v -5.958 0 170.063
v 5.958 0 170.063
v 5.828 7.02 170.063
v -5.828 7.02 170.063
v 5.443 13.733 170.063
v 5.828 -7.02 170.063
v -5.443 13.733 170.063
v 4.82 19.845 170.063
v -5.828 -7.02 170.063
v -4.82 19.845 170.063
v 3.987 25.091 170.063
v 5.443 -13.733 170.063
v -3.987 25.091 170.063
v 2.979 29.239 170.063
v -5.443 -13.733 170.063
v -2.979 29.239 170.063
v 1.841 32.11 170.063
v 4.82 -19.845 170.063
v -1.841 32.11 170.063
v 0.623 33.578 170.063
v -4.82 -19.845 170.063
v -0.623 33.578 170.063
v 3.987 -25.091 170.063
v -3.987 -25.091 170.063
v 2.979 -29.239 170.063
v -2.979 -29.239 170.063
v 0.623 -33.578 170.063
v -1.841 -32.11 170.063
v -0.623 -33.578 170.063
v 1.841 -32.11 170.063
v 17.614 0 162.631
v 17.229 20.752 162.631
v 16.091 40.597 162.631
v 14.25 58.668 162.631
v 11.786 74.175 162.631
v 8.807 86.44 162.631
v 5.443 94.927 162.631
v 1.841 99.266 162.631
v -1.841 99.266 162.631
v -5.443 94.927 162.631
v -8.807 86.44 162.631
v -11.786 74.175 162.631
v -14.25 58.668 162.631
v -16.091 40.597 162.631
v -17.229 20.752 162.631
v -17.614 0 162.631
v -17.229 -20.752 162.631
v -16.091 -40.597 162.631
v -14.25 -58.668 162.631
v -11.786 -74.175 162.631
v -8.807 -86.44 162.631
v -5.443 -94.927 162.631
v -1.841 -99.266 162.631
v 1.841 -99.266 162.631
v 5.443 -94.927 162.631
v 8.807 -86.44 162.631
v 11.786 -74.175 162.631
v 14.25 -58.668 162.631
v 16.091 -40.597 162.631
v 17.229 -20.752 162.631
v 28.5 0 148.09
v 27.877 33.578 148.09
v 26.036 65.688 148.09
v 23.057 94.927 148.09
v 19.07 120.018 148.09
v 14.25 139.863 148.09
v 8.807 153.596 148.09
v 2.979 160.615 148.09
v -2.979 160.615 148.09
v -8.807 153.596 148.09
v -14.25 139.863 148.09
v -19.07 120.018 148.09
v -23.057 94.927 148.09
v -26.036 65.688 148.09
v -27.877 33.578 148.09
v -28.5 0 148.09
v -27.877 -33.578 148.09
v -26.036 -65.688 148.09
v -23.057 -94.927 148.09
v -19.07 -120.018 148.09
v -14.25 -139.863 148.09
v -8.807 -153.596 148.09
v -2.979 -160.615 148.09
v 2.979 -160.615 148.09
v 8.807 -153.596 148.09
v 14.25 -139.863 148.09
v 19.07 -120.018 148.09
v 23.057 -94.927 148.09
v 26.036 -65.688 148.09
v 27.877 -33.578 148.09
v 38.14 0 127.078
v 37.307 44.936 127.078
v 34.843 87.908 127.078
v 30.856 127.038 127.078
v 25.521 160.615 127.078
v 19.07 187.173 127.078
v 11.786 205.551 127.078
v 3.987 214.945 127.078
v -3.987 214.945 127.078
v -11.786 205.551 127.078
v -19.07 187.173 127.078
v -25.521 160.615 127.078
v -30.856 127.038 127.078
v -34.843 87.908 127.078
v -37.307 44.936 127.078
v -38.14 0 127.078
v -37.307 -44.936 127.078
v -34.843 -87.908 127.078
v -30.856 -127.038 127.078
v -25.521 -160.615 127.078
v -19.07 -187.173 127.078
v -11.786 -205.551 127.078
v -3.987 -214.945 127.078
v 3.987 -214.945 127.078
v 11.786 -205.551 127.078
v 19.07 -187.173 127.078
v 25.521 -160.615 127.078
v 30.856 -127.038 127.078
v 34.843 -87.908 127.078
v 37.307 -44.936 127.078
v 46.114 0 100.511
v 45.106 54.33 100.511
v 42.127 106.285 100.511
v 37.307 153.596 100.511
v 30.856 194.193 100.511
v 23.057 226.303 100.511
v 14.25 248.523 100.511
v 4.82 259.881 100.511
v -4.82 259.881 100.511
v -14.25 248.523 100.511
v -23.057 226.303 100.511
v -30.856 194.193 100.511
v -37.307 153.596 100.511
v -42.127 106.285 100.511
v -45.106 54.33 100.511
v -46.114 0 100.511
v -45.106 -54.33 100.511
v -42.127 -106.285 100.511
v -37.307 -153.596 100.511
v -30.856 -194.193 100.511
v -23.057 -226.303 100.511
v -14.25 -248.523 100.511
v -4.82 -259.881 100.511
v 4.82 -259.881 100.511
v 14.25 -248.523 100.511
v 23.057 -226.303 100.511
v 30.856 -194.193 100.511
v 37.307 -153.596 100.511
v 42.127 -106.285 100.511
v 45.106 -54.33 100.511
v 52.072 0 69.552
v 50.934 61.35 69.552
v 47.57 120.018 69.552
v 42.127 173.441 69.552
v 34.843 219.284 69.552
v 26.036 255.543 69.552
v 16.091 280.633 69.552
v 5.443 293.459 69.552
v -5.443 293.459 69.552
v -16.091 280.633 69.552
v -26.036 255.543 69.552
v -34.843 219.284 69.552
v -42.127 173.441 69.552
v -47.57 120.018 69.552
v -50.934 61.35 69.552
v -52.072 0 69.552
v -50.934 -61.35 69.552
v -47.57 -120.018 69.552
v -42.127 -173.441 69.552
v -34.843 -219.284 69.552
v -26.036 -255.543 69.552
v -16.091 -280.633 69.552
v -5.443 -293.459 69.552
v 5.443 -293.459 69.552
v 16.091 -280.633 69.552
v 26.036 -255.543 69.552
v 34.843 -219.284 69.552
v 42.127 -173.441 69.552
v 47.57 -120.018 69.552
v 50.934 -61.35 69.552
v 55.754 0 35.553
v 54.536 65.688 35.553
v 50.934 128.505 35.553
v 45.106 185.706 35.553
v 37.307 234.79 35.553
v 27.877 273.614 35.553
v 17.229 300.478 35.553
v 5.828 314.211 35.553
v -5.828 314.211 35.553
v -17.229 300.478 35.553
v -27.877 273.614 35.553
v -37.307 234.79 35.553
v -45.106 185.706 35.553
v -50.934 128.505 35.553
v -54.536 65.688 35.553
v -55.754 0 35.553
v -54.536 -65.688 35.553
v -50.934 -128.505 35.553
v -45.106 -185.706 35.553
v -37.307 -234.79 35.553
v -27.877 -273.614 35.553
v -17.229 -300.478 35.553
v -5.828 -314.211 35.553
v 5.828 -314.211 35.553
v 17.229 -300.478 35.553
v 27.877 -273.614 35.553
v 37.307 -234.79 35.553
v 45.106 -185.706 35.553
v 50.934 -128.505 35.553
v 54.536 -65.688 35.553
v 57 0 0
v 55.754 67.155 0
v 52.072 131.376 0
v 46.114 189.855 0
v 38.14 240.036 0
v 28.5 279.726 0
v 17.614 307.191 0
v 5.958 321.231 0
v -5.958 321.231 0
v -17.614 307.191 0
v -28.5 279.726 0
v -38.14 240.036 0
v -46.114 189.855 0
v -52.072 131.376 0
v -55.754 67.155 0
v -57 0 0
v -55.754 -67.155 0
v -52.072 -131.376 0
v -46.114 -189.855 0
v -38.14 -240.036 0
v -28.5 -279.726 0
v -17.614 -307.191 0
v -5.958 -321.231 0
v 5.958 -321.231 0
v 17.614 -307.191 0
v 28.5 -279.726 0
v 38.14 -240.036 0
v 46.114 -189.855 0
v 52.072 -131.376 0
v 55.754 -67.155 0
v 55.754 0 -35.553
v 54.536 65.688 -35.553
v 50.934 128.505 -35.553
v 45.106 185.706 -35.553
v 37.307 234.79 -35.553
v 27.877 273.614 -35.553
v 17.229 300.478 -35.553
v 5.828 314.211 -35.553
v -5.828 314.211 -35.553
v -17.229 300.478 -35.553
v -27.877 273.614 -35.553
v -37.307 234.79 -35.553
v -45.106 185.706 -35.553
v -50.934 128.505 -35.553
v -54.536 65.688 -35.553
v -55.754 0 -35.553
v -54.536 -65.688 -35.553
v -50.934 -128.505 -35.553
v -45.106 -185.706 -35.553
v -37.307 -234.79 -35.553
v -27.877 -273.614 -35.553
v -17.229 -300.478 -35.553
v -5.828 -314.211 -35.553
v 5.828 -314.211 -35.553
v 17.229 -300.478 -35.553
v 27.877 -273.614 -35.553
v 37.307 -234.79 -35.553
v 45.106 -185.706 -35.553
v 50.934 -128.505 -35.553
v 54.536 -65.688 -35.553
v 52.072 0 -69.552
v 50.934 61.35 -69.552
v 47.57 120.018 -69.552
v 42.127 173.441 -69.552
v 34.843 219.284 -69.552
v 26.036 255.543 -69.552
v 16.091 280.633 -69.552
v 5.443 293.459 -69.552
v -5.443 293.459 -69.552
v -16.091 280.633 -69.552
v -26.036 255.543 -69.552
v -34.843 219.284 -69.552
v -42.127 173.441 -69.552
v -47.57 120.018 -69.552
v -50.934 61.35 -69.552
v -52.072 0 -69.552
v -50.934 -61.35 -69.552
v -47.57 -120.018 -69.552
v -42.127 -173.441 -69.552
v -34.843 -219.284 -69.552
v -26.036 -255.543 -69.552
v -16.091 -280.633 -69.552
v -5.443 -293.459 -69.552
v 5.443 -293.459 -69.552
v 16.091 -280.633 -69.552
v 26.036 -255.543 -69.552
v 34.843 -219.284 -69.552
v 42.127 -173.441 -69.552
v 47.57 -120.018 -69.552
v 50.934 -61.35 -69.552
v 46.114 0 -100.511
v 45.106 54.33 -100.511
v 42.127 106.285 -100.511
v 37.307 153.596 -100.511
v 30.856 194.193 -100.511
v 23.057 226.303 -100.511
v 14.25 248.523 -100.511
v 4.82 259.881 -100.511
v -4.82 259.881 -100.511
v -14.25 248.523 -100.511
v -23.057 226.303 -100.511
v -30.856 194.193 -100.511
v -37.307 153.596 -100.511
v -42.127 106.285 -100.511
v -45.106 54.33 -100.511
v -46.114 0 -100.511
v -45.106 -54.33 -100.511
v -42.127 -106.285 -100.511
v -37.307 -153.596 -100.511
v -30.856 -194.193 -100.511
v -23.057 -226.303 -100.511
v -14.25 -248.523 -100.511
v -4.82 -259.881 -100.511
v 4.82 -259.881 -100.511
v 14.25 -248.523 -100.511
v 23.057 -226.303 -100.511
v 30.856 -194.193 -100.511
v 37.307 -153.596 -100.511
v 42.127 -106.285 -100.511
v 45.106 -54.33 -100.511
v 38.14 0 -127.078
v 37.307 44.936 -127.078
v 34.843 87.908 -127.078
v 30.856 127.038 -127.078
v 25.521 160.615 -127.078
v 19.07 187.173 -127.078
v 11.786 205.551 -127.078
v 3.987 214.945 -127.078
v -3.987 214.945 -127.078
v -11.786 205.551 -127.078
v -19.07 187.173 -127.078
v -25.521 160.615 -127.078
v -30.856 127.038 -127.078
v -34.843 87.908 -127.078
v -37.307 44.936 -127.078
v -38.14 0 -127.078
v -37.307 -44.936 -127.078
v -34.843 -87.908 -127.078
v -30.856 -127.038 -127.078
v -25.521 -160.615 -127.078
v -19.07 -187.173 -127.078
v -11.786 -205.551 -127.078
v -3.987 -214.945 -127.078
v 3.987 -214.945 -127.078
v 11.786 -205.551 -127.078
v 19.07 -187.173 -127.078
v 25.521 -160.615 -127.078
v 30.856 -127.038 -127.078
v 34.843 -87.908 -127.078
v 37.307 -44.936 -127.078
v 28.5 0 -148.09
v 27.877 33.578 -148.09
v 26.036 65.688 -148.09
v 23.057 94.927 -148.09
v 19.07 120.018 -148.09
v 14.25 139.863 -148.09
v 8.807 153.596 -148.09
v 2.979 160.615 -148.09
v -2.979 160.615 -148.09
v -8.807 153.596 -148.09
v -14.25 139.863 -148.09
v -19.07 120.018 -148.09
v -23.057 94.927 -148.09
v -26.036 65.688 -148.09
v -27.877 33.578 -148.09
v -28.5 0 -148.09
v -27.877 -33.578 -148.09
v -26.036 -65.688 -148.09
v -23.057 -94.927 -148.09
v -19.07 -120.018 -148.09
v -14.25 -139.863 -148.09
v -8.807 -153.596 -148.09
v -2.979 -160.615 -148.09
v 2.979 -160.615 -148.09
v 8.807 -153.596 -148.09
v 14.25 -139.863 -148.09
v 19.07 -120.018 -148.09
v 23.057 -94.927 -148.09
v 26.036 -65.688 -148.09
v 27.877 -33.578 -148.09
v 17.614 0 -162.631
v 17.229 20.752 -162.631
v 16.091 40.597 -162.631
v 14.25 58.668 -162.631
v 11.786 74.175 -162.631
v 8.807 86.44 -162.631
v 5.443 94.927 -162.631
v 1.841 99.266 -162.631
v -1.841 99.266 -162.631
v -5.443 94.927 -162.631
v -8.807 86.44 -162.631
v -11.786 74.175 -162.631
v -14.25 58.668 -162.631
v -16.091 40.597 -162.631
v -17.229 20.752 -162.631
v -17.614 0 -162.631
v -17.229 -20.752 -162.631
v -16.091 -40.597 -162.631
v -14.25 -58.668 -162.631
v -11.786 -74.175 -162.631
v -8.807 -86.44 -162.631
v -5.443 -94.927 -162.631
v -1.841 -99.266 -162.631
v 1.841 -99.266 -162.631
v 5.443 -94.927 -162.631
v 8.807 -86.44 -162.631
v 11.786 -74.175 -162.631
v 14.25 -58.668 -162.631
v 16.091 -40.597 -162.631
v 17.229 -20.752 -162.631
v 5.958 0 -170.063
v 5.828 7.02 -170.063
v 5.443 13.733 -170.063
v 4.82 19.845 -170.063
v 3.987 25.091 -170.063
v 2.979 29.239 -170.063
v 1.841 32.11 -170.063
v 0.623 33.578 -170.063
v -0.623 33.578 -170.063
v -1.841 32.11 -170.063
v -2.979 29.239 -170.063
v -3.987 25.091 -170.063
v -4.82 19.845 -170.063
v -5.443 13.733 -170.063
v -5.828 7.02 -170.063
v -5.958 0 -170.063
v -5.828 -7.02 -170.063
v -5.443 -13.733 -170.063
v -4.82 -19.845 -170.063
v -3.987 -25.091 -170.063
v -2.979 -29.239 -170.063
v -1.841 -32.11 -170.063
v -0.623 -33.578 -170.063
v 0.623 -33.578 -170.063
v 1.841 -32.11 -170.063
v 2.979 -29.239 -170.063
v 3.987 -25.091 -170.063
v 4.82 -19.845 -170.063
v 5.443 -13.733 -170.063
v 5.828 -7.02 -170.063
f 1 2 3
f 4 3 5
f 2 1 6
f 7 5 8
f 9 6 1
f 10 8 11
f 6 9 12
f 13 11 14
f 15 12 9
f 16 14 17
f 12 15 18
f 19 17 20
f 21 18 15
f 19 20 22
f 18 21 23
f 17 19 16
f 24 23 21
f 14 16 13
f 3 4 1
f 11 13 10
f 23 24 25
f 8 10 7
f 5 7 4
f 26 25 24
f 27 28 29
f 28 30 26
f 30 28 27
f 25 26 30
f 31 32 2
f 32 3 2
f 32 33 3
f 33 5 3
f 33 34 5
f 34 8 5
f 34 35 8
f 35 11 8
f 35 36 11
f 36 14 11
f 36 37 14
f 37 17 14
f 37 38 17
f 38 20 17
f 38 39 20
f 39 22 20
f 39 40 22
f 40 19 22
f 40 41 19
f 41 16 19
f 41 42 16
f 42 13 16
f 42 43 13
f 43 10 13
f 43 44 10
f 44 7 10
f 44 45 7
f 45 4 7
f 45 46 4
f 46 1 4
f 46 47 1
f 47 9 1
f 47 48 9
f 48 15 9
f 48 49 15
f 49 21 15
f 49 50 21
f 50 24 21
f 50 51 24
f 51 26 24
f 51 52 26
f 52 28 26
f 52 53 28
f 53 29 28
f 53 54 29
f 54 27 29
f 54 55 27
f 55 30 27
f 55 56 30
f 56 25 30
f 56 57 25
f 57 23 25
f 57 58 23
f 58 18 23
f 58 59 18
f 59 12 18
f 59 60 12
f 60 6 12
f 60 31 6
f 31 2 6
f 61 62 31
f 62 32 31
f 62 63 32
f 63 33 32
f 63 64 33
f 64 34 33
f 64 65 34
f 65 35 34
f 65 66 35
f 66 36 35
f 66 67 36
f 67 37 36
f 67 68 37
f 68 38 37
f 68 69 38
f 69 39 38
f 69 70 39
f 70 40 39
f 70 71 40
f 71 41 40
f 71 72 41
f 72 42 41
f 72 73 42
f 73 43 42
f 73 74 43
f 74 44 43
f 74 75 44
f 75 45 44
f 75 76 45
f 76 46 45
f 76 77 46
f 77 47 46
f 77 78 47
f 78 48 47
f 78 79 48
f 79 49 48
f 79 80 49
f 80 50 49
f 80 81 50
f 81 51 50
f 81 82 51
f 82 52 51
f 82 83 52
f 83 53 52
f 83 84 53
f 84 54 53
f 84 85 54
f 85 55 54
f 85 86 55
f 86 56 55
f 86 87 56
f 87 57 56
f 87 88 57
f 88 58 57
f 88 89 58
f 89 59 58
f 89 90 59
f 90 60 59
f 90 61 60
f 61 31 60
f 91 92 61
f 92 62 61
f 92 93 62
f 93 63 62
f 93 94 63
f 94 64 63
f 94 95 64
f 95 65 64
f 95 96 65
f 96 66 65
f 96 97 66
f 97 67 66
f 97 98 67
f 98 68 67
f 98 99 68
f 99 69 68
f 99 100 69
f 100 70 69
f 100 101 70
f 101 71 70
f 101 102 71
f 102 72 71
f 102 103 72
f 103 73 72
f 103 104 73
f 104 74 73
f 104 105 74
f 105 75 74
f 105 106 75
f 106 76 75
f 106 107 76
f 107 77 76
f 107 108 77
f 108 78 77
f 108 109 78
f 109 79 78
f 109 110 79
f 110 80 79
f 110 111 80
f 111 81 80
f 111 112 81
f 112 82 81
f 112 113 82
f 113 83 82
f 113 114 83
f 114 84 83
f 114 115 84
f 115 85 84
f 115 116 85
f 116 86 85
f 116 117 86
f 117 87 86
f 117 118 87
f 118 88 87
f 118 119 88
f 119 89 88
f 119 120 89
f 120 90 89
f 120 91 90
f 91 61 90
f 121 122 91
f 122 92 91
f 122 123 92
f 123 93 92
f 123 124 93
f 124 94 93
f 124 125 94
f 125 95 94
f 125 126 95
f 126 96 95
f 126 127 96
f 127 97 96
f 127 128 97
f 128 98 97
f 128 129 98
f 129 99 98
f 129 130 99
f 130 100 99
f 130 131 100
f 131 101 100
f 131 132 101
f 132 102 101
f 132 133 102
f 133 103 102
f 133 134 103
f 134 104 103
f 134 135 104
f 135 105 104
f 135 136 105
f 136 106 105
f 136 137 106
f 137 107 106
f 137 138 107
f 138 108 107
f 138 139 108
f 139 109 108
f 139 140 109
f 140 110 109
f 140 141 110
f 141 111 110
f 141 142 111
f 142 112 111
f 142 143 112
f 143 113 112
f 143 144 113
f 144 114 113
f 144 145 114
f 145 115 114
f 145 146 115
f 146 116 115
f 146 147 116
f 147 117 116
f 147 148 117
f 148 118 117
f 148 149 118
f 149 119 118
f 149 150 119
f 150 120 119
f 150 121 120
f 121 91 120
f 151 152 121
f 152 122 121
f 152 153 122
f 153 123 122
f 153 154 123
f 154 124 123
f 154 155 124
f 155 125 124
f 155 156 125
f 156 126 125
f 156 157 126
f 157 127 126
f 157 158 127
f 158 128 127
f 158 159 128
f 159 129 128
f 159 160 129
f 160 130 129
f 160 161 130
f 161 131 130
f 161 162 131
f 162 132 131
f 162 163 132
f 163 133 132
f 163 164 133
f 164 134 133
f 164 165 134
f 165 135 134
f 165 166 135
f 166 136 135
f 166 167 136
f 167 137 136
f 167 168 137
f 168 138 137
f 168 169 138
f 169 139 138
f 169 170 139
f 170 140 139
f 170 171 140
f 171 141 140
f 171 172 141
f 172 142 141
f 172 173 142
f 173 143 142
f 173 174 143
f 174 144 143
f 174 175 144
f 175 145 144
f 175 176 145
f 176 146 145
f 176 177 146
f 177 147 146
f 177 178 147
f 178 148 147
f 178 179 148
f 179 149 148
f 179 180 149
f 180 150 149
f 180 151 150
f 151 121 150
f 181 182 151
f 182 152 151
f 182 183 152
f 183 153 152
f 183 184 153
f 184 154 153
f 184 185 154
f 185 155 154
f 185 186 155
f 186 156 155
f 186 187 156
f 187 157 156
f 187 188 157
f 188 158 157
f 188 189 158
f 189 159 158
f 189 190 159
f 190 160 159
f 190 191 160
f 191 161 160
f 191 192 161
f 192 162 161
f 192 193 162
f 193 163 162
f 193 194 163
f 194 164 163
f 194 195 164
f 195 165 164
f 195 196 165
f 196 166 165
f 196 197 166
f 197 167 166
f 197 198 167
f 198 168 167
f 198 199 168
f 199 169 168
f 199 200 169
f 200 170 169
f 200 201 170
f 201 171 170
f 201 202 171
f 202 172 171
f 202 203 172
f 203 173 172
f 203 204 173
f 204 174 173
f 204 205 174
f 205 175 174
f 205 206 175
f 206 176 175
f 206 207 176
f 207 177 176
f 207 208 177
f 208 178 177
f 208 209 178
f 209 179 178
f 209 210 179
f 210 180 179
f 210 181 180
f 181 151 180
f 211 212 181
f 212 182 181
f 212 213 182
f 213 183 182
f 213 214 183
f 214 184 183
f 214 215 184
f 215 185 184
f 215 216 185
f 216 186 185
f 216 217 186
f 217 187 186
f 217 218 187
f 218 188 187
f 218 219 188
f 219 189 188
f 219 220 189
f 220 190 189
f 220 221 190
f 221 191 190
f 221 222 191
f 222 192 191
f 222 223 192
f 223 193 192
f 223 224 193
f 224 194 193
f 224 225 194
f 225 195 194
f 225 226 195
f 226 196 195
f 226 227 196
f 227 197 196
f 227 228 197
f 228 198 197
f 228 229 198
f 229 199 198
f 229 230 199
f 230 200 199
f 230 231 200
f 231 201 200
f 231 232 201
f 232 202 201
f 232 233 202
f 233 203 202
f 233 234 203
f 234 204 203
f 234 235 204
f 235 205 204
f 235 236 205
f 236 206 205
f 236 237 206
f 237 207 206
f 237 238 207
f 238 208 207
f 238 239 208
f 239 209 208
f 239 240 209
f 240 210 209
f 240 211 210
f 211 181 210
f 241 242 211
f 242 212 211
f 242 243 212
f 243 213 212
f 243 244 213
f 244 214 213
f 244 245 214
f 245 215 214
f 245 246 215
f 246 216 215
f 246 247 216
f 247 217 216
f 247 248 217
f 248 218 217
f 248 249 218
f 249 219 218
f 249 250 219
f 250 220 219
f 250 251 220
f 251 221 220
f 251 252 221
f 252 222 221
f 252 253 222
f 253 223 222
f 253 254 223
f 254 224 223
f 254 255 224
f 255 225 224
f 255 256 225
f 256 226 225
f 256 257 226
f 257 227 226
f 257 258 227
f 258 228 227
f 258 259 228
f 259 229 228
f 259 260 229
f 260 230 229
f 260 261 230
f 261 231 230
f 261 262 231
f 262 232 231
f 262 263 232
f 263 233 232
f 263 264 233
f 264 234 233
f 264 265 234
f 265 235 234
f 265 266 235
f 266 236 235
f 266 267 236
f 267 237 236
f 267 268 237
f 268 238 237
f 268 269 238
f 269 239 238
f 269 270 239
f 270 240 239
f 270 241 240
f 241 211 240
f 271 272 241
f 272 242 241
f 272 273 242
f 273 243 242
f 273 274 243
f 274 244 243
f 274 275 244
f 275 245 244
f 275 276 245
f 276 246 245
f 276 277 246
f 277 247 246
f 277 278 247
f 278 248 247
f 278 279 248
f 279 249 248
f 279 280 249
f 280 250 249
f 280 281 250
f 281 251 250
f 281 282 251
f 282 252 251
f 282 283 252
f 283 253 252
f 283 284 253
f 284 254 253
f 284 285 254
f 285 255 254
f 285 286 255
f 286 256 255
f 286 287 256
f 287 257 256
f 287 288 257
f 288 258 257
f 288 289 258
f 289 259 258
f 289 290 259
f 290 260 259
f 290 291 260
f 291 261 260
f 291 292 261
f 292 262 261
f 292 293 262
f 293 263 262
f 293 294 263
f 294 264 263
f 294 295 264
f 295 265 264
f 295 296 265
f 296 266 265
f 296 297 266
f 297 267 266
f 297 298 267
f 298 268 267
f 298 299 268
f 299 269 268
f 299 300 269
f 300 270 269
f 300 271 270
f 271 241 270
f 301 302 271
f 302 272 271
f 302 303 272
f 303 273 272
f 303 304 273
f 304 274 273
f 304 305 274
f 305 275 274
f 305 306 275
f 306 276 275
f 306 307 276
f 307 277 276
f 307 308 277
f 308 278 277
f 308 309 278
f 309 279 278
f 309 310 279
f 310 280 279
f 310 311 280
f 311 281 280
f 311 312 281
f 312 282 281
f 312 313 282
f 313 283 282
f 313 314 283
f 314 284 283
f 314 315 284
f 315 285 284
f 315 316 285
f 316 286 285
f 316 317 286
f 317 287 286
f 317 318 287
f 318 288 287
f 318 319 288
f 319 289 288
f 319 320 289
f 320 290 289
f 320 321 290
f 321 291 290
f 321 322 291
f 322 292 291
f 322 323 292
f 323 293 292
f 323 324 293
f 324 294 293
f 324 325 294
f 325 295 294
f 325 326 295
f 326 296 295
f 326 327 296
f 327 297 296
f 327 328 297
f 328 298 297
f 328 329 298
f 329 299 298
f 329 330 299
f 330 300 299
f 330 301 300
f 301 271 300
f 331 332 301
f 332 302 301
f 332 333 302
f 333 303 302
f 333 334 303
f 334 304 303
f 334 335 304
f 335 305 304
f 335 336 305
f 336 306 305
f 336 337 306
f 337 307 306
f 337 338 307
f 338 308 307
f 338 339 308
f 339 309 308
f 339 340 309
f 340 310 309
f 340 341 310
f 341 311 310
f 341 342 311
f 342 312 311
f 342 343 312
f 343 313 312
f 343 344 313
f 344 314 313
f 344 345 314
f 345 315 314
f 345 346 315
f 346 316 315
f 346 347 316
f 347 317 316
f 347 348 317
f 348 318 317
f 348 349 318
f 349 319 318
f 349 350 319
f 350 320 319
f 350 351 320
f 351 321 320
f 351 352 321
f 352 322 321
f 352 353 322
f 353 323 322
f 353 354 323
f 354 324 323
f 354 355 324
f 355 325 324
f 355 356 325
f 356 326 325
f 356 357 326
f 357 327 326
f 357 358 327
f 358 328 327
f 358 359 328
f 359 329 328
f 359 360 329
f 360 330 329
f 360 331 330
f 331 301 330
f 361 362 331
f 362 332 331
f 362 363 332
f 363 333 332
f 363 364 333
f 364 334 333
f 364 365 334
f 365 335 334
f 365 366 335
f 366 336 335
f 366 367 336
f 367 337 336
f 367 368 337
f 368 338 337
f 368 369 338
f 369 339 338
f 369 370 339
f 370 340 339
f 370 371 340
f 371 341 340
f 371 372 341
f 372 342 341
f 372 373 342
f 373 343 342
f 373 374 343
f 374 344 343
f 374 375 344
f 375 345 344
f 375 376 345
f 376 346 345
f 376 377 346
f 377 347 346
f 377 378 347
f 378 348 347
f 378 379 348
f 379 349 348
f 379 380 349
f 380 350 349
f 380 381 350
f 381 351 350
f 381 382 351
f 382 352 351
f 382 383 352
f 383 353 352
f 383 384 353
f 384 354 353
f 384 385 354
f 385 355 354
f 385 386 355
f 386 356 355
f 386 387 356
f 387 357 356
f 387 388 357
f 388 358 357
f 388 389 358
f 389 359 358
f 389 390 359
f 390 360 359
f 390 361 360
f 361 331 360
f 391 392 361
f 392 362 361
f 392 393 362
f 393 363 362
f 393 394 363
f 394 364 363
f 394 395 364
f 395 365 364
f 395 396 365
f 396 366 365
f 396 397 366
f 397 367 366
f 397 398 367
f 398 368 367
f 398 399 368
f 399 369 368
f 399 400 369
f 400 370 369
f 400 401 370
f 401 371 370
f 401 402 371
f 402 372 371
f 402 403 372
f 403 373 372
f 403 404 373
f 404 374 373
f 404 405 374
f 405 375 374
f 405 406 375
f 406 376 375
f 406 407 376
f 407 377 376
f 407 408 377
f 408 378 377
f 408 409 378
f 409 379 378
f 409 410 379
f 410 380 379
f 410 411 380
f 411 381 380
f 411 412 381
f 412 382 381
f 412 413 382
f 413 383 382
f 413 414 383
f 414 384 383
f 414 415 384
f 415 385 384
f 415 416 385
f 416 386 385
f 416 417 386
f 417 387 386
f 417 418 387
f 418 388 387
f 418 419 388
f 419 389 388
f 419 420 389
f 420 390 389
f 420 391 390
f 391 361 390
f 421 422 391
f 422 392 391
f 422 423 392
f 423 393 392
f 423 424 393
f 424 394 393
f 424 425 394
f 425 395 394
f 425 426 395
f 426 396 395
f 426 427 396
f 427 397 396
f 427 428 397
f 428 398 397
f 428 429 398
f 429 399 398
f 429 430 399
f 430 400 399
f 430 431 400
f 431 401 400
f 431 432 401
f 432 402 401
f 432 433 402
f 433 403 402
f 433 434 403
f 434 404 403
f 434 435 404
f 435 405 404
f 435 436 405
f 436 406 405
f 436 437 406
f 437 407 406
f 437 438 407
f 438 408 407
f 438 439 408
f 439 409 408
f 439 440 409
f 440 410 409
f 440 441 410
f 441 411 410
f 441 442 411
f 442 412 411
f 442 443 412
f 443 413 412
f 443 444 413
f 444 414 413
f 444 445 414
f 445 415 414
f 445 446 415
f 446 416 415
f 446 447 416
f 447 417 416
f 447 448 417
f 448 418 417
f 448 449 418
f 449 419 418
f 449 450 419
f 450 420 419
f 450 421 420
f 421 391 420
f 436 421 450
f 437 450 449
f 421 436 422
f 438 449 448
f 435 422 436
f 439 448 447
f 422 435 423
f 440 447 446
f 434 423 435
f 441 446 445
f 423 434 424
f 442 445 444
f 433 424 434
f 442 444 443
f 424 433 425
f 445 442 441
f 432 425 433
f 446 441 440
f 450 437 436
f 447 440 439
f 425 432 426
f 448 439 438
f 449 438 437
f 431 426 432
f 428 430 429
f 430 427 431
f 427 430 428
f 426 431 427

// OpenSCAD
// Generated by SolidPython 1.0.1 on 2020-07-29 00:46:46


scale(v = [3, 17, 9]) {
	sphere(r = 19);
}
/***********************************************
*********      SolidPython code:      **********
************************************************
 
# import packages: SolidPython
from solid import *
from solid.utils import *
from itertools import chain, combinations, permutations


class Resize:

    def __init__(self, scad_file):
        self.scad_file = scad_file
        #self.scad_file = import_scad(scad_file)
        # cone/cylinder param:
        self.r1 = 0
        self.r2 = 0
        self.h = 0
        # rectangular prism param:
        self.w = 0
        self.l = 0
        # ellipse param:
        self.r = 0

    # import OpenScad code (file name corresponds to shape)


    # classify shape + parameters
    def assign(self, param1, param2, param3):
        if self.scad_file == 'cone.scad':
            self.r1 = param1
            self.r2 = param2
            self.h = param3
        elif self.scad_file == 'cylinder.scad':
            self.r1 = param1
            self.r2 = param2
            self.h = param3
        elif self.scad_file == 'rectangularPrism.scad':
            self.h = param1
            self.l = param2
            self.w = param3
        else:
            self.r = param1
            self.h = param2

    # resize parameters
    def iterate(self):
        x = range(3, 20, 2)
        i = 1
        if self.scad_file == 'cone.scad':
            tempList = list(permutations(x, 2))
            for temp in tempList:
                param1 = temp[0]
                param2 = temp[1]
                filepath = 'produced_scad_files/' + 'cone' + str(param1) + '_' + str(param2) + '_' + '.scad'
                scad_render_to_file(cylinder(h=param1, r1=param2, r2=0), filepath)

        elif self.scad_file == 'cylinder.scad':
            tempList = list(permutations(x, 3))
            for temp in tempList:
                param1 = temp[0]
                param2 = temp[1]
                filepath = 'produced_scad_files/' + 'cylinder' + str(param1) + '_' + str(param2) + '_' + '.scad'
                scad_render_to_file(cylinder(h=param1, r1=param2, r2=param2), filepath)

        elif self.scad_file == 'rectangularPrism.scad':
            tempList = list(permutations(x, 3))
            for temp in tempList:
                param1 = temp[0]
                param2 = temp[1]
                param3 = temp[2]
                filepath = 'produced_scad_files/' + 'rectangularPrism' + str(param1) + '_' + str(param2) + '_' + str(
                    param3) + '.scad'
                scad_render_to_file(cube(size=(param1, param2, param3)), filepath)

        elif self.scad_file == 'ellipse.scad':
            tempList = list(permutations(x, 4))
            for temp in tempList:
                param1 = temp[0]
                param2 = temp[1]
                param3 = temp[2]
                param4 = temp[3]
                filepath = 'produced_scad_files/' + 'ellipse' + str(param1) + '_' + str(param2) + '_' + str(param3) + '_' + str(param4) + '.scad'
                scad_render_to_file(scale([param1, param2, param3])(sphere(r=param4)), filepath)

    def render_to_scadfile(self):
        scad_render_to_file(scad, 'example.scad') 
 
************************************************/
